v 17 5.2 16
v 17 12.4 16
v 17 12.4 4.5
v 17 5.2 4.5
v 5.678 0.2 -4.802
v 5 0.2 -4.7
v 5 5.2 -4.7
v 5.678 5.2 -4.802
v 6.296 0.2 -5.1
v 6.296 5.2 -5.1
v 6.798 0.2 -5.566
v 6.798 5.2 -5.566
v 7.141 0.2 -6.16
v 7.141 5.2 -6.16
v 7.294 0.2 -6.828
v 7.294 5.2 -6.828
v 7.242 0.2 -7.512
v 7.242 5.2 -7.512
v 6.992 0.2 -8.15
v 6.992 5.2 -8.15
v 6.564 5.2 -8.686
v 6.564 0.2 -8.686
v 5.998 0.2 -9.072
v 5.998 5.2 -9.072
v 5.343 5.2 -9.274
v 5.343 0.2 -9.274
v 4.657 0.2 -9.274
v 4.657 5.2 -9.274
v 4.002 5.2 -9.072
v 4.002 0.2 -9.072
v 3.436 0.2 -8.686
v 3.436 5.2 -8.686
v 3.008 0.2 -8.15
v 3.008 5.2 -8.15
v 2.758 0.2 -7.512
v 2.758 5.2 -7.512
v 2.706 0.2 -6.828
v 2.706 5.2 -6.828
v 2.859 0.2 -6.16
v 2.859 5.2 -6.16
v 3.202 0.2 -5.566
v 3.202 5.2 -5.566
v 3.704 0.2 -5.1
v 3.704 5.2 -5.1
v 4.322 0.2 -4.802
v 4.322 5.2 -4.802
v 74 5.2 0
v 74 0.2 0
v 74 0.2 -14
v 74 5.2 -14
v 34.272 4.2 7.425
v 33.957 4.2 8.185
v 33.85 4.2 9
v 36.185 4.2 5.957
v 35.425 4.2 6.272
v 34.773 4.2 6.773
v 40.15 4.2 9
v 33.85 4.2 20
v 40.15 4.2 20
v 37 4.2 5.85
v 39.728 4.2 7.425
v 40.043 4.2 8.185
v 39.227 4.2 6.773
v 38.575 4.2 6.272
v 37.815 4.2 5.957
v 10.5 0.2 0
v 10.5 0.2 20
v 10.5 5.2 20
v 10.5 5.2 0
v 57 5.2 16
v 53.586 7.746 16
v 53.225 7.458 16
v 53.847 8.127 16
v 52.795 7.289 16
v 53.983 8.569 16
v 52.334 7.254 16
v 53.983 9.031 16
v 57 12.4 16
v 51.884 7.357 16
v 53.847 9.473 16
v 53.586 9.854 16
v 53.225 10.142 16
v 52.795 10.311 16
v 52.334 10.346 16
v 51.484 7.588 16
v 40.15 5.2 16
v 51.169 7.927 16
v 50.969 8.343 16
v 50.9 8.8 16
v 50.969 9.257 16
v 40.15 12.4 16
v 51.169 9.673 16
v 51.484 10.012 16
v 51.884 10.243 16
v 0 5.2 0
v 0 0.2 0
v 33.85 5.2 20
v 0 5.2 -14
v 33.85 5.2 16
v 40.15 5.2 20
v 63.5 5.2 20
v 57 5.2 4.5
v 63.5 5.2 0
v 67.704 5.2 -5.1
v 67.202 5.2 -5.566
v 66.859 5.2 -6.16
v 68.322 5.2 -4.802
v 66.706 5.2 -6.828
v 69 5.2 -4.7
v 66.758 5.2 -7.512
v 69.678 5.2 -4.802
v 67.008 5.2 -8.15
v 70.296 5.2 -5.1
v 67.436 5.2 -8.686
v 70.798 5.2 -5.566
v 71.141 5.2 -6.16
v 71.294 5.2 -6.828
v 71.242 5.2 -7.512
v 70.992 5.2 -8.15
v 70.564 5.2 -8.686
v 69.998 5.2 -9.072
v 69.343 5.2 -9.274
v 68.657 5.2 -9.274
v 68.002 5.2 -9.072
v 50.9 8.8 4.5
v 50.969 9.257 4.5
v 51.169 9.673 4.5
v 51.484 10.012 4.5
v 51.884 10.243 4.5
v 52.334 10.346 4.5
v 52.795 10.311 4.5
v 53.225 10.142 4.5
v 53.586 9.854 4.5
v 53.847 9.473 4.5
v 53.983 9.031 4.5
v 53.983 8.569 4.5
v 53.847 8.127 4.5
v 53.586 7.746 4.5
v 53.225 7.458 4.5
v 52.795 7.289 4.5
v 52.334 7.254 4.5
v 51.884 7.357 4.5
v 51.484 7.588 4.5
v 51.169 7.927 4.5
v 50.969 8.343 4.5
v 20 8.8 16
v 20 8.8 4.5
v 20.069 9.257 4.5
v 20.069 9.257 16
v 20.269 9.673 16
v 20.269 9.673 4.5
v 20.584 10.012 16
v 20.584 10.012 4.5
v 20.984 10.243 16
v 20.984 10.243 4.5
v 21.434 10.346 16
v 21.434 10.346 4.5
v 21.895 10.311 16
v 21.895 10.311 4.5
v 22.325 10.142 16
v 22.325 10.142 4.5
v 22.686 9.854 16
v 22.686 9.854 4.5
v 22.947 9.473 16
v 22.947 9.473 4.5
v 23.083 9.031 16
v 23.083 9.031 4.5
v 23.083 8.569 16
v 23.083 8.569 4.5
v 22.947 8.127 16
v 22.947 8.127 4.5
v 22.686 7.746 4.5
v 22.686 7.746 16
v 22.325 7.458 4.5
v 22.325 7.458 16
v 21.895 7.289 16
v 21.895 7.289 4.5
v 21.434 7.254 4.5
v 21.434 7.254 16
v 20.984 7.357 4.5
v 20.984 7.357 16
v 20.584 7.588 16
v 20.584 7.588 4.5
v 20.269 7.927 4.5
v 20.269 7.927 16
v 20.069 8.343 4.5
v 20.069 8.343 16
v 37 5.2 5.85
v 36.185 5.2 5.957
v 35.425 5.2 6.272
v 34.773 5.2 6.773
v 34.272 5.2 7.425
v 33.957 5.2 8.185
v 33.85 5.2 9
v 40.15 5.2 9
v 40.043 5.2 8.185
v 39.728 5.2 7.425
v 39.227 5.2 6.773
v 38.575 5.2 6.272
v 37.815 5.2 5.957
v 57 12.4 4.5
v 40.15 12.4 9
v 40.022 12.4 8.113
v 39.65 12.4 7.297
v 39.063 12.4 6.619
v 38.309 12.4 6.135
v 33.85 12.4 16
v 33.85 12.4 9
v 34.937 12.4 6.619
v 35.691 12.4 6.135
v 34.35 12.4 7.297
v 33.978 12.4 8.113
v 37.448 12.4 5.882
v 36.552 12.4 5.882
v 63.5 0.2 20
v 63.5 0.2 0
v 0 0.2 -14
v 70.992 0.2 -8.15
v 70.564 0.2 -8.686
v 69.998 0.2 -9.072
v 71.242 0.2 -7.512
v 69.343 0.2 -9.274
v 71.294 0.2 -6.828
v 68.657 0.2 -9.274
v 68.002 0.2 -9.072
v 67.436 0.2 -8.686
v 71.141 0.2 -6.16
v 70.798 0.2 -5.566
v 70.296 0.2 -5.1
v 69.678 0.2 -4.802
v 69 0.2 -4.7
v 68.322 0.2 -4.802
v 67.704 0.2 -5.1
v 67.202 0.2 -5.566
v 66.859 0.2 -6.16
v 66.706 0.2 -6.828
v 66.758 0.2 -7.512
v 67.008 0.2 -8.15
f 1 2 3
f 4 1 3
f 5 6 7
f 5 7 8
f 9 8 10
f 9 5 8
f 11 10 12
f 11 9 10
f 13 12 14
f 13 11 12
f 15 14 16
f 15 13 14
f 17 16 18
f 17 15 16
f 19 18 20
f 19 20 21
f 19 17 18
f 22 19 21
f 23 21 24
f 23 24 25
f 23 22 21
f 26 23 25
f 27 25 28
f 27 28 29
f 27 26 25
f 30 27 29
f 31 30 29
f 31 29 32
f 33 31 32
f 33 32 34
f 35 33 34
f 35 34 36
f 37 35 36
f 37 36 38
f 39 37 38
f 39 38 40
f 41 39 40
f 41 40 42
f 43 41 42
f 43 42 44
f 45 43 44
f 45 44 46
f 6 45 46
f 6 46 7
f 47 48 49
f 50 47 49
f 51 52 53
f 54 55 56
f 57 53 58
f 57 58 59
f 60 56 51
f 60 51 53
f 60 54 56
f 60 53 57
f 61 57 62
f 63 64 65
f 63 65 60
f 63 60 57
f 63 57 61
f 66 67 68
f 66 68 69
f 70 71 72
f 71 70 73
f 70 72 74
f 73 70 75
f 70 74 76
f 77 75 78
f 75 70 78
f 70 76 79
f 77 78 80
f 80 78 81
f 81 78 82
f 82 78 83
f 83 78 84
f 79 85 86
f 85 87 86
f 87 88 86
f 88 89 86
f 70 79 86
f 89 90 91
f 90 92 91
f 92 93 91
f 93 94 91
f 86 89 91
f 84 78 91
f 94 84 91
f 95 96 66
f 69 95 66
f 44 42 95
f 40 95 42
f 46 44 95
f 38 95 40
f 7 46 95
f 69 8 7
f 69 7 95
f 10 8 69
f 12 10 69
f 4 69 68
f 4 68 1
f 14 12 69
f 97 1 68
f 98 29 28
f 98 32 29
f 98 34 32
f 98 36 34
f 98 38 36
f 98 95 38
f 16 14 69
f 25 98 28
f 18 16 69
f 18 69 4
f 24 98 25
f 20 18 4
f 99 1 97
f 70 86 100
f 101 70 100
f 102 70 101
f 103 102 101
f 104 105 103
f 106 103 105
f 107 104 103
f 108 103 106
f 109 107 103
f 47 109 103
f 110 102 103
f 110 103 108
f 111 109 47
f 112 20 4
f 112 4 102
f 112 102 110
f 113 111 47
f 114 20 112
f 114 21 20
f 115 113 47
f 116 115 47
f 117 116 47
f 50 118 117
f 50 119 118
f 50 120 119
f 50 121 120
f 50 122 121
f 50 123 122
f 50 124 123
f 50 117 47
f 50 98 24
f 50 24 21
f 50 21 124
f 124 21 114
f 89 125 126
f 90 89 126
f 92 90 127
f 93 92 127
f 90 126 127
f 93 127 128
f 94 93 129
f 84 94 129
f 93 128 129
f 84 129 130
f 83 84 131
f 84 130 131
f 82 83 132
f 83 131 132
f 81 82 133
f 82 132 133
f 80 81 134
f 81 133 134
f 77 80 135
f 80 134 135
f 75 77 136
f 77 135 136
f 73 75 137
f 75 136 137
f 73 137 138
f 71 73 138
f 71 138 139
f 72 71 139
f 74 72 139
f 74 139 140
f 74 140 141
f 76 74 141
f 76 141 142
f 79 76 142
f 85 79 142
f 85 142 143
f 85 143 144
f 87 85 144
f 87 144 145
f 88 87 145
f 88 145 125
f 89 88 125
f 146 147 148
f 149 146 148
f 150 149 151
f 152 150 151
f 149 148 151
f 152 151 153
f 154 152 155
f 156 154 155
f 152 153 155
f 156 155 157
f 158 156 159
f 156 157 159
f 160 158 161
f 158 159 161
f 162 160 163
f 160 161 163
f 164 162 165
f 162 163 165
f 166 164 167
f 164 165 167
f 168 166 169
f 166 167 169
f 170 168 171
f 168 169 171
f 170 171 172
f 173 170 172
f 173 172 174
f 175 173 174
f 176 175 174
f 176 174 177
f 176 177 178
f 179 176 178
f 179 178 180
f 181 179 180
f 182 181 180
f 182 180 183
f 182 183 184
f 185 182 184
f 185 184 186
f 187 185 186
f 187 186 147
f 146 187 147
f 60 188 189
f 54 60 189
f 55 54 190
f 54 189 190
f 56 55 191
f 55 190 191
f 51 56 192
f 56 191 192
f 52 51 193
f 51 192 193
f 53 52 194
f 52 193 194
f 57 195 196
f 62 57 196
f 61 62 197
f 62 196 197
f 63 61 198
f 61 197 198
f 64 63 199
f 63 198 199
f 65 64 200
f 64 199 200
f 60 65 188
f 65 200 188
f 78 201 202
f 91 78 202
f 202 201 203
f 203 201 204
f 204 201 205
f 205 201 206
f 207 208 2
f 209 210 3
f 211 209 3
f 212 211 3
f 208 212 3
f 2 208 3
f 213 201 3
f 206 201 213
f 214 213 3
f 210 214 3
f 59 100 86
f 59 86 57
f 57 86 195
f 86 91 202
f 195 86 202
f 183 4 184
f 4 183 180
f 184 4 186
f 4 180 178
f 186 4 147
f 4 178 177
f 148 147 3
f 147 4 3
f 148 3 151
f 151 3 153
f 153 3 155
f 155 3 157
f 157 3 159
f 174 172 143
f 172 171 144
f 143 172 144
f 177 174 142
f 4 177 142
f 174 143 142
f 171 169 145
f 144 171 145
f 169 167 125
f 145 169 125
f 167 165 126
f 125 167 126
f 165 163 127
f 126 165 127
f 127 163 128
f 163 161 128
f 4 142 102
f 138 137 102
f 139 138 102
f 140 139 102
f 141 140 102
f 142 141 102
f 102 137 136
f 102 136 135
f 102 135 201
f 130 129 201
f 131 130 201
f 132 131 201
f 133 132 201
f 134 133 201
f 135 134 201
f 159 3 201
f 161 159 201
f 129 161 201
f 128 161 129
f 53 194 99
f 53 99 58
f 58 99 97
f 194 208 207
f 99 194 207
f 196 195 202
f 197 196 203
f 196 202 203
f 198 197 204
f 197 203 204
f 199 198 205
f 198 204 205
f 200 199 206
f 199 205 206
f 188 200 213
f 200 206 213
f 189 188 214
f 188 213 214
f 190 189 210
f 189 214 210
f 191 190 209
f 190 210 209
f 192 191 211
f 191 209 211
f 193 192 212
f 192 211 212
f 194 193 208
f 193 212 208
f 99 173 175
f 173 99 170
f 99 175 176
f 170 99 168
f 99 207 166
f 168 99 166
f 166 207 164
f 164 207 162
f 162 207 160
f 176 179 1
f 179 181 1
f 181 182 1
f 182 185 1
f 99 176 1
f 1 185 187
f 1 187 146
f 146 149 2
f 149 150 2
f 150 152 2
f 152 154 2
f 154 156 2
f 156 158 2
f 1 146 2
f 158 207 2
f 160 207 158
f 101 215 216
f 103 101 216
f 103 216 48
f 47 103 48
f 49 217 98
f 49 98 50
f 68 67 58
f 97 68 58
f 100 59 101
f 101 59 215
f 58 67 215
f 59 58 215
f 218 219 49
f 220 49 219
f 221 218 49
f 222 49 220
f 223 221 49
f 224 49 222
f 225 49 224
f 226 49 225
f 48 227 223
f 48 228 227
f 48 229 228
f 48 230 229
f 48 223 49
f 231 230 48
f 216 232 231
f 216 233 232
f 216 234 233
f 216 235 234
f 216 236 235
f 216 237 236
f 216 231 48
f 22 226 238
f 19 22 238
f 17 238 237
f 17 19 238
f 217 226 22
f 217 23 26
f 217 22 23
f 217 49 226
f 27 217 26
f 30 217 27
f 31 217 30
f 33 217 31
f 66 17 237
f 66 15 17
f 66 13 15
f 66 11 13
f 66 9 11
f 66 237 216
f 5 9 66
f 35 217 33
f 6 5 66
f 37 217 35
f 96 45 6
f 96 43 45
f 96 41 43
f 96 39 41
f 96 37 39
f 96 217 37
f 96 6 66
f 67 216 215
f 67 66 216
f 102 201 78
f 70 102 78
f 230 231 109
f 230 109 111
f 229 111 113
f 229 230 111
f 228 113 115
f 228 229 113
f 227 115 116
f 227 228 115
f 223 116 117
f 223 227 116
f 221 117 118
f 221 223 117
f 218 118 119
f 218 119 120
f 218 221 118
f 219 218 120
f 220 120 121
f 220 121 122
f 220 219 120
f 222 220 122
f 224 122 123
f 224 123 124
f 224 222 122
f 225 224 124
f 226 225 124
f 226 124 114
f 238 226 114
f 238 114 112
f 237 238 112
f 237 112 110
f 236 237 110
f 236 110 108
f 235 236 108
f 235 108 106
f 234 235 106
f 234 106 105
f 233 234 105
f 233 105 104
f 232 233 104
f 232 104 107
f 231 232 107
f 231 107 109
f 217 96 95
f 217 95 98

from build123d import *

# Parameters (mm, degrees)
SKETCH1_W           = 74
SKETCH1_H           = 14
SKETCH1_R           = 2.3
SKETCH1_W_2         = 53
SKETCH1_H_2         = 20
BOSS_EXTRUDE1_DEPTH = 5.2
CUT_EXTRUDE1_DEPTH  = 1
BOSS_EXTRUDE2_START = 7.2
BOSS_EXTRUDE2_DEPTH = 7.2
SKETCH5_R           = 1.55
CUT_EXTRUDE2_DEPTH  = 78.278781046
SKETCH6_W           = 34
SKETCH6_H           = 0.2
CUT_EXTRUDE3_DEPTH  = 78.651529283


with BuildPart() as part:
    # Sketch1 → Boss-Extrude1 (new body)
    # profile 1 of 2: a face of its own
    with BuildSketch(Plane(origin=(0, 0, 0), x_dir=(1, 0, 0), z_dir=(0, 1, 0))):
        with Locations((37, 7)):
            Rectangle(SKETCH1_W, SKETCH1_H)
        with Locations(Location((5, 7, 0), (0, 0, 270))):
            Circle(SKETCH1_R, mode=Mode.SUBTRACT)
        with Locations(Location((69, 7, 0), (0, 0, 270))):
            Circle(SKETCH1_R, mode=Mode.SUBTRACT)
    # profile 2 of 2: a face of its own
    with BuildSketch(Plane(origin=(0, 0, 0), x_dir=(1, 0, 0), z_dir=(0, 1, 0))):
        with Locations((37, -10)):
            Rectangle(SKETCH1_W_2, SKETCH1_H_2)
    extrude(amount=BOSS_EXTRUDE1_DEPTH)

    # Sketch2 → Cut-Extrude1 (cut)
    with BuildSketch(Plane(origin=(0, 5.2, 0), x_dir=(1, 0, 0), z_dir=(0, 1, 0))):
        with BuildLine():
            ThreePointArc((37, -5.85), (34.772613639, -6.772613639), (33.85, -9))
            Line((33.85, -9), (33.85, -20))
            Line((33.85, -20), (40.15, -20))
            Line((40.15, -20), (40.15, -9))
            ThreePointArc((40.15, -9), (39.227386361, -6.772613639), (37, -5.85))
        make_face()
    extrude(amount=-CUT_EXTRUDE1_DEPTH, mode=Mode.SUBTRACT)

    # Sketch3 → Boss-Extrude2 (add)
    with BuildSketch(Plane(origin=(0, 5.2, 0), x_dir=(1, 0, 0), z_dir=(0, 1, 0)).offset(BOSS_EXTRUDE2_START)):
        with BuildLine():
            Line((33.85, -9), (33.85, -16))
            Line((33.85, -16), (17, -16))
            Line((17, -16), (17, -4.5))
            Line((17, -4.5), (57, -4.5))
            Line((57, -4.5), (57, -16))
            Line((57, -16), (40.15, -16))
            Line((40.15, -16), (40.15, -9))
            ThreePointArc((40.15, -9), (37, -5.85), (33.85, -9))
        make_face()
    extrude(amount=-BOSS_EXTRUDE2_DEPTH)

    # Sketch5 → Cut-Extrude2 (cut, through all)
    with BuildSketch(Plane(origin=(0, 0, 4.5), x_dir=(-1, 0, 0), z_dir=(0, 0, -1))):
        with Locations((-52.45, 8.8)):
            Circle(SKETCH5_R)
        with Locations((-21.55, 8.8)):
            Circle(SKETCH5_R)
    extrude(amount=-CUT_EXTRUDE2_DEPTH, mode=Mode.SUBTRACT)

    # Sketch6 → Cut-Extrude3 (cut, through all)
    with BuildSketch(Plane.ZY):
        with Locations((3, 0.1)):
            Rectangle(SKETCH6_W, SKETCH6_H)
    extrude(amount=-CUT_EXTRUDE3_DEPTH, mode=Mode.SUBTRACT)


solid = part.part
